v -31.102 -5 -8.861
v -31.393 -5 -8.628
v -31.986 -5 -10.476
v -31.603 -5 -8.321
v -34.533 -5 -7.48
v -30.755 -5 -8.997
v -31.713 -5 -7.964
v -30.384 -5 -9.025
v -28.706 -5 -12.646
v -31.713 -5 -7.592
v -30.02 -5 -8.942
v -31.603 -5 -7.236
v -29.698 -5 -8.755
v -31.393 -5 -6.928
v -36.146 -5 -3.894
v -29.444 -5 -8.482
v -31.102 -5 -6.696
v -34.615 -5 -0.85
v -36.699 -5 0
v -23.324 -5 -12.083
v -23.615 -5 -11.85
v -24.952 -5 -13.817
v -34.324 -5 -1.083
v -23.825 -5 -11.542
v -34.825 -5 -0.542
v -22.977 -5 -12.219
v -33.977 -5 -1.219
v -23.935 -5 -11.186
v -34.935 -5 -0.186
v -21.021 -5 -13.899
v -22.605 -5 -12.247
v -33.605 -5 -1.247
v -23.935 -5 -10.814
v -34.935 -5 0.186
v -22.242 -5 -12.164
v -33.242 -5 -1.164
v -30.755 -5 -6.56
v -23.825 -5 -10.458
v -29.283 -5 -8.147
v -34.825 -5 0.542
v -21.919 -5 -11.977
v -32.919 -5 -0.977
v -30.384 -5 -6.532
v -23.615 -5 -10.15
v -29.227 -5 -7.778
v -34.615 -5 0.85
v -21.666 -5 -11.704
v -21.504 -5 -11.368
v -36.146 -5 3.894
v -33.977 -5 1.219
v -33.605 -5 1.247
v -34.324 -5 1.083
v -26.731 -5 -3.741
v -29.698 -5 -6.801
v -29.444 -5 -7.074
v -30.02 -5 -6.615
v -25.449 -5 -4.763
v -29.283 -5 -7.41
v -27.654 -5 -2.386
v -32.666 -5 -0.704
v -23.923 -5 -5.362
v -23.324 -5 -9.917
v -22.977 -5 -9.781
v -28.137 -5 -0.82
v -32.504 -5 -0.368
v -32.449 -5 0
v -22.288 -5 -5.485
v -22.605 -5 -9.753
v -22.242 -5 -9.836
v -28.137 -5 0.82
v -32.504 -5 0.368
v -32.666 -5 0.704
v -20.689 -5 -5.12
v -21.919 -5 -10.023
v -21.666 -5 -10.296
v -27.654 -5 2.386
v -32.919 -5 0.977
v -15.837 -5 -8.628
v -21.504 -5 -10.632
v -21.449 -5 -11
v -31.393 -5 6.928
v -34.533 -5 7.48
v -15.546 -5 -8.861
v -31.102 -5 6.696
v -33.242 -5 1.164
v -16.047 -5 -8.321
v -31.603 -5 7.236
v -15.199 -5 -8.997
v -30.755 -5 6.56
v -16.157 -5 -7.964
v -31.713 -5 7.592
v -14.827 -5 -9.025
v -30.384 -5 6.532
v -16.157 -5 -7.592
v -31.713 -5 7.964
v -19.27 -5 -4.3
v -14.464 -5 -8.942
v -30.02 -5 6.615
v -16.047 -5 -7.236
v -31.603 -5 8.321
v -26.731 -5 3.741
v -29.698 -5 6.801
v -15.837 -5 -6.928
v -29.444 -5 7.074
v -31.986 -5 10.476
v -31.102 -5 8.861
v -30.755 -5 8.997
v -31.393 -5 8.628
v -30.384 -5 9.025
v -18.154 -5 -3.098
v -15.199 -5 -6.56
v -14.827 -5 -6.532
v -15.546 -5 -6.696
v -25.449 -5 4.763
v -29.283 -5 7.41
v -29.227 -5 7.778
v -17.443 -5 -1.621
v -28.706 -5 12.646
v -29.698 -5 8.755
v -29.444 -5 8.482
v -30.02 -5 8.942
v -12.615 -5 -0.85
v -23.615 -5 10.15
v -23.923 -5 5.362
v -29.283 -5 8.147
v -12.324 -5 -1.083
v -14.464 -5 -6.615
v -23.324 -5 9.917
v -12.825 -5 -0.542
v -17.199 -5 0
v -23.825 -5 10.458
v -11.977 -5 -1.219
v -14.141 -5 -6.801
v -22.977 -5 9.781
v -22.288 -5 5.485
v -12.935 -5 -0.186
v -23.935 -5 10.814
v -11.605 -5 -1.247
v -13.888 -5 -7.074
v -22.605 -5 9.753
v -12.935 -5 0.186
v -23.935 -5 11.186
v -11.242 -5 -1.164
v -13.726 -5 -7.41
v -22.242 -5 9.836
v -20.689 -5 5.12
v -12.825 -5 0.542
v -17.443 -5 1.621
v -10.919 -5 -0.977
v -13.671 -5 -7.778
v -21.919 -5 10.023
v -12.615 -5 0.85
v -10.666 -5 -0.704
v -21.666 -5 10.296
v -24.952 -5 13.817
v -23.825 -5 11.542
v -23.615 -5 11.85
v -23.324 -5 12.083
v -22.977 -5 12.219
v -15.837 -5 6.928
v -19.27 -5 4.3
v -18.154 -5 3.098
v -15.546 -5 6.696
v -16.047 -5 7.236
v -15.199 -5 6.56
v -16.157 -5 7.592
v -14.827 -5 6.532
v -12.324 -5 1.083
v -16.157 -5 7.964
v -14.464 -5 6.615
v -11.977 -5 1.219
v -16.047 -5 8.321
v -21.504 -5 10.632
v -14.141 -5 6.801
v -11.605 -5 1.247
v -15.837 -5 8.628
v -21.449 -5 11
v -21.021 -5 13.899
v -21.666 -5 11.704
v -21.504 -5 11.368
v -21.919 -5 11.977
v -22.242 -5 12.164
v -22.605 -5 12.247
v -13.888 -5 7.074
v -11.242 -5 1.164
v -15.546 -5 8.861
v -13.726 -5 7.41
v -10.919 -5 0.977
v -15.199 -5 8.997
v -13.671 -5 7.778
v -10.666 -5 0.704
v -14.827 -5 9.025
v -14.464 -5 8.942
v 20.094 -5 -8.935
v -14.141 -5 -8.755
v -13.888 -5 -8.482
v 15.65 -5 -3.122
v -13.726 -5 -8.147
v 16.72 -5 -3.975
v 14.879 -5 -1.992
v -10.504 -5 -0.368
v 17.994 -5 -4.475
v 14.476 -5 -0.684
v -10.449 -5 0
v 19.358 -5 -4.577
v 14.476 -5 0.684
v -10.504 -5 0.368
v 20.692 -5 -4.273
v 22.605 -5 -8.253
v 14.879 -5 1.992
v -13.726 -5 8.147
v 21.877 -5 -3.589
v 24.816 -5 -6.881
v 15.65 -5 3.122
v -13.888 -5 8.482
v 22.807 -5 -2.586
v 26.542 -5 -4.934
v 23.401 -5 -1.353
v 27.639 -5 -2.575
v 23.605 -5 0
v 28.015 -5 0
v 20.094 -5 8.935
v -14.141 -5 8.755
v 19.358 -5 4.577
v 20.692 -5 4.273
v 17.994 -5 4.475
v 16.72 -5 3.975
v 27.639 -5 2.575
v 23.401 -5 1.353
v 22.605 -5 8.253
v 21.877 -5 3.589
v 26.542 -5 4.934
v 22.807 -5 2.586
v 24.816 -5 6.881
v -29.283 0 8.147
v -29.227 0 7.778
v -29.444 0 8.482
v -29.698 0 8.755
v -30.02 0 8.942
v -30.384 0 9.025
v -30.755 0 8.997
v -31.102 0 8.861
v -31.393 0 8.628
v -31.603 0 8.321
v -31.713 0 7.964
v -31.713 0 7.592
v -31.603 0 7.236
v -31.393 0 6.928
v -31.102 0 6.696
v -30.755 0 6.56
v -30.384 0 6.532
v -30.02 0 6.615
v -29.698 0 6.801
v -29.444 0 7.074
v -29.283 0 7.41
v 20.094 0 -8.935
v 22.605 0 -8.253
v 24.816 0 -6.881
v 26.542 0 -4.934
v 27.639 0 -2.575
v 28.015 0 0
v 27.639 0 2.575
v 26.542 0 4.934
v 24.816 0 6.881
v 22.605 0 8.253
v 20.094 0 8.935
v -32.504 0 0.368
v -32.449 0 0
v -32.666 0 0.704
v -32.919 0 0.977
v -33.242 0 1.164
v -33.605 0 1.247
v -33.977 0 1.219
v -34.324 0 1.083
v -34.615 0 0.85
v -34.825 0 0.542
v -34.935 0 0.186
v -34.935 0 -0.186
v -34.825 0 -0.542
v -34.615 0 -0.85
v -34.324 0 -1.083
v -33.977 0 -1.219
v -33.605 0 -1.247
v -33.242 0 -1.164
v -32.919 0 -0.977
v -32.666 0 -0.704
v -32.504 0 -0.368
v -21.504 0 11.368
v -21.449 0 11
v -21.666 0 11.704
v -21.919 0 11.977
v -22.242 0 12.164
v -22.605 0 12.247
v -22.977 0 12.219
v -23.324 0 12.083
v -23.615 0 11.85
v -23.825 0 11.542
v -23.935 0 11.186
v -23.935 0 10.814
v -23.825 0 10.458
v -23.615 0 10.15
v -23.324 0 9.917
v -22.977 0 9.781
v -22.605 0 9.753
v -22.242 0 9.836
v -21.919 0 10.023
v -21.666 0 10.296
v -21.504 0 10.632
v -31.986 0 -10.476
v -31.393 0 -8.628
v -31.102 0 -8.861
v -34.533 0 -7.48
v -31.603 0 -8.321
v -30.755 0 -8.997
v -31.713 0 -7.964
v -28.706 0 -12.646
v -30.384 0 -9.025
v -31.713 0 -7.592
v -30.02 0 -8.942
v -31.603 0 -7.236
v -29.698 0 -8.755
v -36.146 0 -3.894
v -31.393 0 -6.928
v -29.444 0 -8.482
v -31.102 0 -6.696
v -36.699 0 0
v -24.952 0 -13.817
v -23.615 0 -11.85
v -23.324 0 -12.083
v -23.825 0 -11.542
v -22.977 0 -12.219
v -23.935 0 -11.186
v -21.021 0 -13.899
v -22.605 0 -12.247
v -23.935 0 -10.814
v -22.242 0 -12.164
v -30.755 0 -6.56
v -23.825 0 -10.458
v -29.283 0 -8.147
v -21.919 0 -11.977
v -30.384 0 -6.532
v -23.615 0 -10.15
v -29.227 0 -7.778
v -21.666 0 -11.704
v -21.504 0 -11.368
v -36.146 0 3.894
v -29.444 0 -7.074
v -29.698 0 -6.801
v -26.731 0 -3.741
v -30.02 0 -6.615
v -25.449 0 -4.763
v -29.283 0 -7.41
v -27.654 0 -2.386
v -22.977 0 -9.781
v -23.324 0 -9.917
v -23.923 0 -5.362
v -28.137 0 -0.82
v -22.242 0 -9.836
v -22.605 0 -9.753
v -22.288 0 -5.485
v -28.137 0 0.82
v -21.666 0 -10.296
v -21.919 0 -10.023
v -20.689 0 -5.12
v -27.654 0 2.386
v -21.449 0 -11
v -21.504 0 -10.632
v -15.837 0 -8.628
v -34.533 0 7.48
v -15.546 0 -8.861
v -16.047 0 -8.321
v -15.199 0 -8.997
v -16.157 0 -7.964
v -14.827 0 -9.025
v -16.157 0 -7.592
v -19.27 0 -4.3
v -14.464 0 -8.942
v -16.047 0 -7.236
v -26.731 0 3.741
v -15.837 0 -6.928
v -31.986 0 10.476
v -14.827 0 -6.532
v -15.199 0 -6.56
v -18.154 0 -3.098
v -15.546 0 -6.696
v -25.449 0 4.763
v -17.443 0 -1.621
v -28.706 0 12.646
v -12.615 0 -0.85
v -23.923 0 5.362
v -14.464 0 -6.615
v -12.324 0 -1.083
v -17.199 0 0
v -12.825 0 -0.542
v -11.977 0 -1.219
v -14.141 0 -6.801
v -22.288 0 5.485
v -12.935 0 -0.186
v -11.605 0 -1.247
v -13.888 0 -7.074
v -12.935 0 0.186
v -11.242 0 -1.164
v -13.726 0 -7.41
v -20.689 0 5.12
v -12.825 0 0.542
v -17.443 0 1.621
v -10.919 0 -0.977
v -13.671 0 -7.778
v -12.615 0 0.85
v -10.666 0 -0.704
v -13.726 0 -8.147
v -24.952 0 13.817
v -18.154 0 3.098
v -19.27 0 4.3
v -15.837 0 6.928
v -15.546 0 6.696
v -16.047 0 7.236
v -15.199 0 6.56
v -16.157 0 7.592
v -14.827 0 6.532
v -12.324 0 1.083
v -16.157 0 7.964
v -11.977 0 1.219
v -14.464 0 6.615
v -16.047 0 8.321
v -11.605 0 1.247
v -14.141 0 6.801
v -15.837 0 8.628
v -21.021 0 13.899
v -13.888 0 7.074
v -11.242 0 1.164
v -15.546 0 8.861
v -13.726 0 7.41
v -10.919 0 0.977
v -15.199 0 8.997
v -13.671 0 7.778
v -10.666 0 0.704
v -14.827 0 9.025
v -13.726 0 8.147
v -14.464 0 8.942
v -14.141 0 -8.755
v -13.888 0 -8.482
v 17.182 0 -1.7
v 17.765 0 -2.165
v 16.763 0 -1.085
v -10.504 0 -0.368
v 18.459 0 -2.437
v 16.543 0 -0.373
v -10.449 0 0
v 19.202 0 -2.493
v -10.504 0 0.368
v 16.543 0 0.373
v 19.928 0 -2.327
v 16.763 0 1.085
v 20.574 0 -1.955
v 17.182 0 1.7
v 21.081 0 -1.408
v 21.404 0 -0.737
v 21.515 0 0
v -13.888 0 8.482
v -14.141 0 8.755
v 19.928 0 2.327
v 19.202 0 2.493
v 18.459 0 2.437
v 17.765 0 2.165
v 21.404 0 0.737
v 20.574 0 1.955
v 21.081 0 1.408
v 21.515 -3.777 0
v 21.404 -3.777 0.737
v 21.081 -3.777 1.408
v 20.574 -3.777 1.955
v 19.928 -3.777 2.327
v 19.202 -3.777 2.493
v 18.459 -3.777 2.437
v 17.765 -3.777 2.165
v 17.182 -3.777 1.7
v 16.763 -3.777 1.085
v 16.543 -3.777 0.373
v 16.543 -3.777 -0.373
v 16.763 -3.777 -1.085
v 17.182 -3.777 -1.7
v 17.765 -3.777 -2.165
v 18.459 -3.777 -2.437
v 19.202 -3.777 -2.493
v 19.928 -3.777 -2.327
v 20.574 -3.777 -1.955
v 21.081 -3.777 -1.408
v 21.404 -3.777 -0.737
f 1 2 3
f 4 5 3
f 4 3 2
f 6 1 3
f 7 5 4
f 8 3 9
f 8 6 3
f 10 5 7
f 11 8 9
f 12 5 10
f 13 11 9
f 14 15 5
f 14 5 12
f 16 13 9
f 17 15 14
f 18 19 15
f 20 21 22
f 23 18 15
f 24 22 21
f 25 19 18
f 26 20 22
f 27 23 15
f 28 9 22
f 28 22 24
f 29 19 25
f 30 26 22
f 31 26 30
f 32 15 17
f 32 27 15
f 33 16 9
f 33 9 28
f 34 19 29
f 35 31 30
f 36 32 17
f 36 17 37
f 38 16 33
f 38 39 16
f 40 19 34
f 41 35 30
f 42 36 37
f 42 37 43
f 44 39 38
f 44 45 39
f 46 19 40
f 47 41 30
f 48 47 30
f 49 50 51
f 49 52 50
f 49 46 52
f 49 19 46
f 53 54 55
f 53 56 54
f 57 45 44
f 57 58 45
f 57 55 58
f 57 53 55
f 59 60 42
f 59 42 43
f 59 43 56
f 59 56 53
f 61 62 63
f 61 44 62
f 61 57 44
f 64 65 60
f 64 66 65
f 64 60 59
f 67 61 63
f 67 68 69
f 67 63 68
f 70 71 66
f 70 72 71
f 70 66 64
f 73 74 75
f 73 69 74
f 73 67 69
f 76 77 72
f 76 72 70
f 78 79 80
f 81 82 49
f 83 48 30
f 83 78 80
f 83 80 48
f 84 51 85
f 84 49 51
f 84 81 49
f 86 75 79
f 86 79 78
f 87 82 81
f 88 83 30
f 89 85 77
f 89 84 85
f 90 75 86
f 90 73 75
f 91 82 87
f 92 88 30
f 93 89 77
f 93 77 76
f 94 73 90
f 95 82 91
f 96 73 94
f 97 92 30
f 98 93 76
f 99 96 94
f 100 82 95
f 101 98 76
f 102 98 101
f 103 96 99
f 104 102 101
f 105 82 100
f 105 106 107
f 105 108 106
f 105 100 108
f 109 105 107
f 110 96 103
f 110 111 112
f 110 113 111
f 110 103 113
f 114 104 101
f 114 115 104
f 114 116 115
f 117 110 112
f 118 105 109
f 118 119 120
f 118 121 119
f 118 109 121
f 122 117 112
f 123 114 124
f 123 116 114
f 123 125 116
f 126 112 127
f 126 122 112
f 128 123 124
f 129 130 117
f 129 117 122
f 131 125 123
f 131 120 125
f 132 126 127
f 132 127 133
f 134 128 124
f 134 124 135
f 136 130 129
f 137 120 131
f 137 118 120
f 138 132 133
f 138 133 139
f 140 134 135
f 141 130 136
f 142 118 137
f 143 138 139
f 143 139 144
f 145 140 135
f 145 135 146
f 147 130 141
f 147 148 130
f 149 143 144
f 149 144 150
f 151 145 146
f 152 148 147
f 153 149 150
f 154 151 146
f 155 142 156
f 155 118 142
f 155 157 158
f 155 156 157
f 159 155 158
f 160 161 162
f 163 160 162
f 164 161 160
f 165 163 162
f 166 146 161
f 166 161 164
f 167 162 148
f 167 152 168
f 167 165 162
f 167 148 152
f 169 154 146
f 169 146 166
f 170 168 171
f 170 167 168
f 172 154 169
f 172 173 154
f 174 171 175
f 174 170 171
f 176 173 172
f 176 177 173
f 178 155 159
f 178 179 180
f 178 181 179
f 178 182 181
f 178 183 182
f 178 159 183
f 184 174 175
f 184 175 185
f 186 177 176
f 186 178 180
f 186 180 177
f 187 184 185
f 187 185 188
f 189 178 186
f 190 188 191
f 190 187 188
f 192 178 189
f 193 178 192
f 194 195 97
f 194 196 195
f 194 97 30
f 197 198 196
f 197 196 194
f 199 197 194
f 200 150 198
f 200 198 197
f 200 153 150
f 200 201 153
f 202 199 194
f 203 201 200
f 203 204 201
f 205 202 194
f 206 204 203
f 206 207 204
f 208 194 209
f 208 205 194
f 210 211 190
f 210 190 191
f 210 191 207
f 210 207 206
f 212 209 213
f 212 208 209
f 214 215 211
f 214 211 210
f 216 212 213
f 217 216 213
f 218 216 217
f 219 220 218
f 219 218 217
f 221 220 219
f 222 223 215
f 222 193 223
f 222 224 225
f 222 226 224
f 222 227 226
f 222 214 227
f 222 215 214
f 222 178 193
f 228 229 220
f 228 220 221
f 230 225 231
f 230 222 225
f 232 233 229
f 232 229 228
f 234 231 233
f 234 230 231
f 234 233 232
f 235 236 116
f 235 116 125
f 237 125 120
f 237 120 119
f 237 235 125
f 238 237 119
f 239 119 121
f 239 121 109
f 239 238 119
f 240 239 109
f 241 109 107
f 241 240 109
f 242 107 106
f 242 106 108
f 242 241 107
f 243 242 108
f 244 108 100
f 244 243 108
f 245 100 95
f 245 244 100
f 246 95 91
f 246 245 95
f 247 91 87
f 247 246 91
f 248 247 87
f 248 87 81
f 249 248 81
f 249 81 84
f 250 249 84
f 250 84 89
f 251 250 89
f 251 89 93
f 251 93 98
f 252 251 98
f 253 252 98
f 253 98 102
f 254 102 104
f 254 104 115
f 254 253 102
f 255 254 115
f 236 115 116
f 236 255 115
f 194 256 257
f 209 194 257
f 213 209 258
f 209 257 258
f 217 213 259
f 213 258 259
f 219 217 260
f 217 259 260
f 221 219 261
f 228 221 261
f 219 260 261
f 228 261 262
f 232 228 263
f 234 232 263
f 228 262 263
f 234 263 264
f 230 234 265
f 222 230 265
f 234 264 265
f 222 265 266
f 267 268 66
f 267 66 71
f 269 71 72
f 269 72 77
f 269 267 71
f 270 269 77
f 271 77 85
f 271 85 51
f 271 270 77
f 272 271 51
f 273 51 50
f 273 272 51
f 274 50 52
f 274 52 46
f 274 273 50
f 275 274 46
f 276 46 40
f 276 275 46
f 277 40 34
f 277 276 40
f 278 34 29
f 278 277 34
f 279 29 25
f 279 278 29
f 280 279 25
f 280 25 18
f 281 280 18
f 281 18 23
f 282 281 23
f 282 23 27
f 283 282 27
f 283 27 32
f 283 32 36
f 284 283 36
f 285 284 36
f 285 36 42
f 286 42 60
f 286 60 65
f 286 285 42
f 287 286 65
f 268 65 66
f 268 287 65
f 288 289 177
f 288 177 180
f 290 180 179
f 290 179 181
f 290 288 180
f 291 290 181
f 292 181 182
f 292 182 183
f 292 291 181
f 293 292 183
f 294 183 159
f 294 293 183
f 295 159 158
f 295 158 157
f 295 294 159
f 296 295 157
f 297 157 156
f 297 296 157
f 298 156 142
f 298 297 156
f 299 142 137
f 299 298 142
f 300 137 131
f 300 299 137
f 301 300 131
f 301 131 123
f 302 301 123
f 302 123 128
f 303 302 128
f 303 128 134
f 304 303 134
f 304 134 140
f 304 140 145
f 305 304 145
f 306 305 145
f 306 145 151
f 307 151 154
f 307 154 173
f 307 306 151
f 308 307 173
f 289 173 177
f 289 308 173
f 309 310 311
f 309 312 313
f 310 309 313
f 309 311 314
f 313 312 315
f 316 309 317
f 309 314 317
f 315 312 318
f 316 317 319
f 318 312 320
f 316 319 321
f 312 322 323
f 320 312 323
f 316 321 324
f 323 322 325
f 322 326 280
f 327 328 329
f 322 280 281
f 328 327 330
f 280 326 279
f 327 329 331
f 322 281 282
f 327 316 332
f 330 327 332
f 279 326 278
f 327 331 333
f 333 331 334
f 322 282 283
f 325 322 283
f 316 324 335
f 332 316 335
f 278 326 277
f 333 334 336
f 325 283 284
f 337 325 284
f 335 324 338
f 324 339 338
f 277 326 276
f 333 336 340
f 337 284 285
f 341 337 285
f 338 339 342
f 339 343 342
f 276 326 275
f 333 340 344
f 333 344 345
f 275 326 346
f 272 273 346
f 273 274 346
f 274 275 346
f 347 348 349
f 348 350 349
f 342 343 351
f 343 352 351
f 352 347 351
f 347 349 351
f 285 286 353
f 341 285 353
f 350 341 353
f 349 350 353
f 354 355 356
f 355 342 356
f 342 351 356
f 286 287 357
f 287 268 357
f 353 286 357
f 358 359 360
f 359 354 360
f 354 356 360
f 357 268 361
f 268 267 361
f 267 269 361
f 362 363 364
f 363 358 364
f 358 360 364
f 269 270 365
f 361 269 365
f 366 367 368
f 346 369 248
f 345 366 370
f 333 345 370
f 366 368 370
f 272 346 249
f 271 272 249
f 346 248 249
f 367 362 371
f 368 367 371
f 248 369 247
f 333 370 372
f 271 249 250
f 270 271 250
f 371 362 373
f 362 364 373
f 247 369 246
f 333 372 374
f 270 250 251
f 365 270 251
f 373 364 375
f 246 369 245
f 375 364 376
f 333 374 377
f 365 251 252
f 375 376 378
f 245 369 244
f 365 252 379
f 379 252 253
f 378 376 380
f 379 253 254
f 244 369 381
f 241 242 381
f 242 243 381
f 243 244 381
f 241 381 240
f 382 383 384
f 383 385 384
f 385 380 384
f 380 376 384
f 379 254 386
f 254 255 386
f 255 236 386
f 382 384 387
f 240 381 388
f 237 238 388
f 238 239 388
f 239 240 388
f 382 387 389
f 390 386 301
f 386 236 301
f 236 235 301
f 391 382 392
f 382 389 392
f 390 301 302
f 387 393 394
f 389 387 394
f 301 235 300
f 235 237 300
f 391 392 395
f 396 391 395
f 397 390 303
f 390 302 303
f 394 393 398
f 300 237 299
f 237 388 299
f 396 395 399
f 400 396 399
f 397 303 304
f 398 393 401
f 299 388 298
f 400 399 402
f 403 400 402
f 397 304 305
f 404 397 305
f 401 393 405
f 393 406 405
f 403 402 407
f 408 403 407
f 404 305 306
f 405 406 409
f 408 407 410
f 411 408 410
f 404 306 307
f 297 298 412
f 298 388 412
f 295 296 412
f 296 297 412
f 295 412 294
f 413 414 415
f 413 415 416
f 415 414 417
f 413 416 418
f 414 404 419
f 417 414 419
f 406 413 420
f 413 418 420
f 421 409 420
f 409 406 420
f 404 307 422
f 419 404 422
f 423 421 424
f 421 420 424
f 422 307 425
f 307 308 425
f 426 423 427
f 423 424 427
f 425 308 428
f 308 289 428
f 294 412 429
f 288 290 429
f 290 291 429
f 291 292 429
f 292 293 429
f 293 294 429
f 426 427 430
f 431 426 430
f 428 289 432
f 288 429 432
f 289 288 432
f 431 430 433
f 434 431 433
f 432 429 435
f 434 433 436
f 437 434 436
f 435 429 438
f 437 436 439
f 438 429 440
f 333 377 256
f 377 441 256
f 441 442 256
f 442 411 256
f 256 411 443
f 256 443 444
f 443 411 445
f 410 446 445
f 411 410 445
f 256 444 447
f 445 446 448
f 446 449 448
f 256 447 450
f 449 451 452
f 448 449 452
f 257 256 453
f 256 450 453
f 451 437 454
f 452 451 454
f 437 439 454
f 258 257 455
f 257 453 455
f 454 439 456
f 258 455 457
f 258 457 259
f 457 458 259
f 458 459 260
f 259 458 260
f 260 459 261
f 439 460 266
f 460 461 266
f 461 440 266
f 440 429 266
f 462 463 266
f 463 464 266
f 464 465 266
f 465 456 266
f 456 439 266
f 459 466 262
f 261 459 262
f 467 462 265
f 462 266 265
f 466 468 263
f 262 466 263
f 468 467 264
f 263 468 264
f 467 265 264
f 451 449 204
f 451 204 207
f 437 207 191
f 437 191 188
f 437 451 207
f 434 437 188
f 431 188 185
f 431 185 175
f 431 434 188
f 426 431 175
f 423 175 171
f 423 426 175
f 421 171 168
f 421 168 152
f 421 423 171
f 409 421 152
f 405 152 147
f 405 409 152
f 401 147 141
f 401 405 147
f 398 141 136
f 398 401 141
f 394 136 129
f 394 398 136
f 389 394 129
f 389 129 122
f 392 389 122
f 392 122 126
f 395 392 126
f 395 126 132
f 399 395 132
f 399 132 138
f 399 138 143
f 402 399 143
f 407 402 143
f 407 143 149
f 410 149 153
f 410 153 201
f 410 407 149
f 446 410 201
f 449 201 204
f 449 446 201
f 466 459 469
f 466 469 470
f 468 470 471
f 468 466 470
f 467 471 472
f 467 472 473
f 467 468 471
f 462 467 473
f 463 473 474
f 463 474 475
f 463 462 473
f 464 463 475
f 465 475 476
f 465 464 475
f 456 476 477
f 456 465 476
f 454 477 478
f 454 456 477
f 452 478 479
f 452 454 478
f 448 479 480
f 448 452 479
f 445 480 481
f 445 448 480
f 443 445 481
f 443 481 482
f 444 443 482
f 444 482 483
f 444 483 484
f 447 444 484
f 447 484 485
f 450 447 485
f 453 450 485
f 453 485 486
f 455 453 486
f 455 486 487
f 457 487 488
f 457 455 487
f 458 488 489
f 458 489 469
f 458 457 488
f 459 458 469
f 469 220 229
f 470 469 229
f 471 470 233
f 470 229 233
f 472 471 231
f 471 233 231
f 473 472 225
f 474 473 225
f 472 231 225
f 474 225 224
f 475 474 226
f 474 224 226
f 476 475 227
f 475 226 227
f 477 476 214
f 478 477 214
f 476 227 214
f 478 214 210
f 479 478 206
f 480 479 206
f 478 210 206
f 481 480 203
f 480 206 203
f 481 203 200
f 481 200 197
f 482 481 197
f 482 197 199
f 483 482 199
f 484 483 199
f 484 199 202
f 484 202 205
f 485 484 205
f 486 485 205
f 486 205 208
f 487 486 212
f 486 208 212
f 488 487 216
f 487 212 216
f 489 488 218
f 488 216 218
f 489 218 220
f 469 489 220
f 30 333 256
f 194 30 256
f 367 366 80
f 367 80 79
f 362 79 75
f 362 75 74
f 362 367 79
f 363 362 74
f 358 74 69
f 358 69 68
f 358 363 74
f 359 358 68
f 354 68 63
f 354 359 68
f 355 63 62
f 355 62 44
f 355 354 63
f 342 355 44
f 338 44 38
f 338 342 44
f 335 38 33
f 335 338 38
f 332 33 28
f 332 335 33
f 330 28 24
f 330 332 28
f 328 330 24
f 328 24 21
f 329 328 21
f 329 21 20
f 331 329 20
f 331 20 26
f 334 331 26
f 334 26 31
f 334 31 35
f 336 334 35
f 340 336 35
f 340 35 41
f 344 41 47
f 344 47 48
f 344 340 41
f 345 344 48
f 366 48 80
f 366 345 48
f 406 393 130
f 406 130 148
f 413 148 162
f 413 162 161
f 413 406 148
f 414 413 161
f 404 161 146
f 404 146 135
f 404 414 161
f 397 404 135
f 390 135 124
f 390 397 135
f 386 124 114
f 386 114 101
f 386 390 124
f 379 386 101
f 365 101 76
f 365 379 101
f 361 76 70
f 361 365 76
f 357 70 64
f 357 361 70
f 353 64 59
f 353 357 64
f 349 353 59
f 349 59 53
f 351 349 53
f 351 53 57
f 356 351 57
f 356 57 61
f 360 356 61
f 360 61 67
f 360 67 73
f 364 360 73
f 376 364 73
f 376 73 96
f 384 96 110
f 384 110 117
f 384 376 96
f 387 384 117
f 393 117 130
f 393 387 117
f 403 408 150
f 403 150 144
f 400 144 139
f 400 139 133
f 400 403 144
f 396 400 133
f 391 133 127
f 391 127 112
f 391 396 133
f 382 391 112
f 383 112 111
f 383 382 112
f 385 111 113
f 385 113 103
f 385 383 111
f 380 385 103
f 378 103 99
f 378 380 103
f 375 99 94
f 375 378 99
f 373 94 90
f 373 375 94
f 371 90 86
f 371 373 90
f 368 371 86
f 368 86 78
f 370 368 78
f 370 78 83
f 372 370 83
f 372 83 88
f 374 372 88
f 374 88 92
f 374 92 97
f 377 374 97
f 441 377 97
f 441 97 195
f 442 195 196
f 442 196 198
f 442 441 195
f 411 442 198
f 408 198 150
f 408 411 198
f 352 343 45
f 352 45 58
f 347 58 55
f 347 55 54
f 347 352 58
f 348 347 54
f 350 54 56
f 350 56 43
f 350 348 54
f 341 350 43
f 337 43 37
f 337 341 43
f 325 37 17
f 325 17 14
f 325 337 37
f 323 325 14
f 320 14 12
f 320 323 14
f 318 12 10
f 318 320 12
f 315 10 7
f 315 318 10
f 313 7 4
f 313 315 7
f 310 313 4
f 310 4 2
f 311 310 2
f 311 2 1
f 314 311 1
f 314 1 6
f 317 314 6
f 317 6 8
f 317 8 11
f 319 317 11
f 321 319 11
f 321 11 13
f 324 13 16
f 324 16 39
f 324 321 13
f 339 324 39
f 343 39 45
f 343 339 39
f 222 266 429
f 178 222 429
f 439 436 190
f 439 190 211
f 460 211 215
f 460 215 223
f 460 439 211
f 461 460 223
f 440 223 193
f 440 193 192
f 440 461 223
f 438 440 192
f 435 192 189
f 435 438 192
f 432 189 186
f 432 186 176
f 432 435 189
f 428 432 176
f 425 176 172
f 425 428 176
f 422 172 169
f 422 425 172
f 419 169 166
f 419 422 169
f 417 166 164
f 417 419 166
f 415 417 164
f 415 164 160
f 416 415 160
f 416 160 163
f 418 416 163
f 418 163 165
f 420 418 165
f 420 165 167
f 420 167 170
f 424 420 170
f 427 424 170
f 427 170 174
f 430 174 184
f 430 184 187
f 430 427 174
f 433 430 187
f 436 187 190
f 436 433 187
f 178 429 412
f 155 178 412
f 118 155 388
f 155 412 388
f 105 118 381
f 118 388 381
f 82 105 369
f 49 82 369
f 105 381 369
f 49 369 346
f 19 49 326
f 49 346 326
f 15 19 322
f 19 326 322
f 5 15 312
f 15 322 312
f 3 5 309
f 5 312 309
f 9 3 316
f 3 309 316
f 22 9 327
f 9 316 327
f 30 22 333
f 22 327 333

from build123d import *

# Parameters (mm, degrees)
F0_R     = 1.25
F0_R_2   = 5.5
F0_R_3   = 2.5
F1_DEPTH = 5
F2_SIZE2 = 2.09
F2_SIZE  = 1.223


with BuildPart() as f1:
    # F0 (on Front) → F1 (new body)
    with BuildSketch(Plane.XZ):
        with BuildLine():
            Line((20.093722, 8.935112), (-21.020701, 13.899064))
            ThreePointArc((-21.020701, 13.899064), (-36.698805, 0), (-21.020701, -13.899064))
            Line((-21.020701, -13.899064), (20.093722, -8.935112))
            ThreePointArc((20.093722, -8.935112), (28.014941, 0), (20.093722, 8.935112))
        make_face()
        with Locations((-22.698805, -11)):
            Circle(F0_R, mode=Mode.SUBTRACT)
        with Locations((-30.47698, -7.778175)):
            Circle(F0_R, mode=Mode.SUBTRACT)
        with Locations((-14.92063, -7.778175)):
            Circle(F0_R, mode=Mode.SUBTRACT)
        with Locations((-33.698805, 0)):
            Circle(F0_R, mode=Mode.SUBTRACT)
        with Locations((-22.698805, 0)):
            Circle(F0_R_2, mode=Mode.SUBTRACT)
        with Locations((-11.698805, 0)):
            Circle(F0_R, mode=Mode.SUBTRACT)
        with Locations((-30.47698, 7.778175)):
            Circle(F0_R, mode=Mode.SUBTRACT)
        with Locations((-22.698805, 11)):
            Circle(F0_R, mode=Mode.SUBTRACT)
        with Locations((-14.92063, 7.778175)):
            Circle(F0_R, mode=Mode.SUBTRACT)
        with Locations((19.014941, 0)):
            Circle(F0_R_3, mode=Mode.SUBTRACT)
    extrude(amount=F1_DEPTH)

    # F2
    f2_edges = [f1.edges().sort_by_distance(p)[0] for p in [
        (16.514941, -5, 0),
    ]]
    chamfer(f2_edges, length=F2_SIZE, length2=F2_SIZE2)


solid = f1.part
